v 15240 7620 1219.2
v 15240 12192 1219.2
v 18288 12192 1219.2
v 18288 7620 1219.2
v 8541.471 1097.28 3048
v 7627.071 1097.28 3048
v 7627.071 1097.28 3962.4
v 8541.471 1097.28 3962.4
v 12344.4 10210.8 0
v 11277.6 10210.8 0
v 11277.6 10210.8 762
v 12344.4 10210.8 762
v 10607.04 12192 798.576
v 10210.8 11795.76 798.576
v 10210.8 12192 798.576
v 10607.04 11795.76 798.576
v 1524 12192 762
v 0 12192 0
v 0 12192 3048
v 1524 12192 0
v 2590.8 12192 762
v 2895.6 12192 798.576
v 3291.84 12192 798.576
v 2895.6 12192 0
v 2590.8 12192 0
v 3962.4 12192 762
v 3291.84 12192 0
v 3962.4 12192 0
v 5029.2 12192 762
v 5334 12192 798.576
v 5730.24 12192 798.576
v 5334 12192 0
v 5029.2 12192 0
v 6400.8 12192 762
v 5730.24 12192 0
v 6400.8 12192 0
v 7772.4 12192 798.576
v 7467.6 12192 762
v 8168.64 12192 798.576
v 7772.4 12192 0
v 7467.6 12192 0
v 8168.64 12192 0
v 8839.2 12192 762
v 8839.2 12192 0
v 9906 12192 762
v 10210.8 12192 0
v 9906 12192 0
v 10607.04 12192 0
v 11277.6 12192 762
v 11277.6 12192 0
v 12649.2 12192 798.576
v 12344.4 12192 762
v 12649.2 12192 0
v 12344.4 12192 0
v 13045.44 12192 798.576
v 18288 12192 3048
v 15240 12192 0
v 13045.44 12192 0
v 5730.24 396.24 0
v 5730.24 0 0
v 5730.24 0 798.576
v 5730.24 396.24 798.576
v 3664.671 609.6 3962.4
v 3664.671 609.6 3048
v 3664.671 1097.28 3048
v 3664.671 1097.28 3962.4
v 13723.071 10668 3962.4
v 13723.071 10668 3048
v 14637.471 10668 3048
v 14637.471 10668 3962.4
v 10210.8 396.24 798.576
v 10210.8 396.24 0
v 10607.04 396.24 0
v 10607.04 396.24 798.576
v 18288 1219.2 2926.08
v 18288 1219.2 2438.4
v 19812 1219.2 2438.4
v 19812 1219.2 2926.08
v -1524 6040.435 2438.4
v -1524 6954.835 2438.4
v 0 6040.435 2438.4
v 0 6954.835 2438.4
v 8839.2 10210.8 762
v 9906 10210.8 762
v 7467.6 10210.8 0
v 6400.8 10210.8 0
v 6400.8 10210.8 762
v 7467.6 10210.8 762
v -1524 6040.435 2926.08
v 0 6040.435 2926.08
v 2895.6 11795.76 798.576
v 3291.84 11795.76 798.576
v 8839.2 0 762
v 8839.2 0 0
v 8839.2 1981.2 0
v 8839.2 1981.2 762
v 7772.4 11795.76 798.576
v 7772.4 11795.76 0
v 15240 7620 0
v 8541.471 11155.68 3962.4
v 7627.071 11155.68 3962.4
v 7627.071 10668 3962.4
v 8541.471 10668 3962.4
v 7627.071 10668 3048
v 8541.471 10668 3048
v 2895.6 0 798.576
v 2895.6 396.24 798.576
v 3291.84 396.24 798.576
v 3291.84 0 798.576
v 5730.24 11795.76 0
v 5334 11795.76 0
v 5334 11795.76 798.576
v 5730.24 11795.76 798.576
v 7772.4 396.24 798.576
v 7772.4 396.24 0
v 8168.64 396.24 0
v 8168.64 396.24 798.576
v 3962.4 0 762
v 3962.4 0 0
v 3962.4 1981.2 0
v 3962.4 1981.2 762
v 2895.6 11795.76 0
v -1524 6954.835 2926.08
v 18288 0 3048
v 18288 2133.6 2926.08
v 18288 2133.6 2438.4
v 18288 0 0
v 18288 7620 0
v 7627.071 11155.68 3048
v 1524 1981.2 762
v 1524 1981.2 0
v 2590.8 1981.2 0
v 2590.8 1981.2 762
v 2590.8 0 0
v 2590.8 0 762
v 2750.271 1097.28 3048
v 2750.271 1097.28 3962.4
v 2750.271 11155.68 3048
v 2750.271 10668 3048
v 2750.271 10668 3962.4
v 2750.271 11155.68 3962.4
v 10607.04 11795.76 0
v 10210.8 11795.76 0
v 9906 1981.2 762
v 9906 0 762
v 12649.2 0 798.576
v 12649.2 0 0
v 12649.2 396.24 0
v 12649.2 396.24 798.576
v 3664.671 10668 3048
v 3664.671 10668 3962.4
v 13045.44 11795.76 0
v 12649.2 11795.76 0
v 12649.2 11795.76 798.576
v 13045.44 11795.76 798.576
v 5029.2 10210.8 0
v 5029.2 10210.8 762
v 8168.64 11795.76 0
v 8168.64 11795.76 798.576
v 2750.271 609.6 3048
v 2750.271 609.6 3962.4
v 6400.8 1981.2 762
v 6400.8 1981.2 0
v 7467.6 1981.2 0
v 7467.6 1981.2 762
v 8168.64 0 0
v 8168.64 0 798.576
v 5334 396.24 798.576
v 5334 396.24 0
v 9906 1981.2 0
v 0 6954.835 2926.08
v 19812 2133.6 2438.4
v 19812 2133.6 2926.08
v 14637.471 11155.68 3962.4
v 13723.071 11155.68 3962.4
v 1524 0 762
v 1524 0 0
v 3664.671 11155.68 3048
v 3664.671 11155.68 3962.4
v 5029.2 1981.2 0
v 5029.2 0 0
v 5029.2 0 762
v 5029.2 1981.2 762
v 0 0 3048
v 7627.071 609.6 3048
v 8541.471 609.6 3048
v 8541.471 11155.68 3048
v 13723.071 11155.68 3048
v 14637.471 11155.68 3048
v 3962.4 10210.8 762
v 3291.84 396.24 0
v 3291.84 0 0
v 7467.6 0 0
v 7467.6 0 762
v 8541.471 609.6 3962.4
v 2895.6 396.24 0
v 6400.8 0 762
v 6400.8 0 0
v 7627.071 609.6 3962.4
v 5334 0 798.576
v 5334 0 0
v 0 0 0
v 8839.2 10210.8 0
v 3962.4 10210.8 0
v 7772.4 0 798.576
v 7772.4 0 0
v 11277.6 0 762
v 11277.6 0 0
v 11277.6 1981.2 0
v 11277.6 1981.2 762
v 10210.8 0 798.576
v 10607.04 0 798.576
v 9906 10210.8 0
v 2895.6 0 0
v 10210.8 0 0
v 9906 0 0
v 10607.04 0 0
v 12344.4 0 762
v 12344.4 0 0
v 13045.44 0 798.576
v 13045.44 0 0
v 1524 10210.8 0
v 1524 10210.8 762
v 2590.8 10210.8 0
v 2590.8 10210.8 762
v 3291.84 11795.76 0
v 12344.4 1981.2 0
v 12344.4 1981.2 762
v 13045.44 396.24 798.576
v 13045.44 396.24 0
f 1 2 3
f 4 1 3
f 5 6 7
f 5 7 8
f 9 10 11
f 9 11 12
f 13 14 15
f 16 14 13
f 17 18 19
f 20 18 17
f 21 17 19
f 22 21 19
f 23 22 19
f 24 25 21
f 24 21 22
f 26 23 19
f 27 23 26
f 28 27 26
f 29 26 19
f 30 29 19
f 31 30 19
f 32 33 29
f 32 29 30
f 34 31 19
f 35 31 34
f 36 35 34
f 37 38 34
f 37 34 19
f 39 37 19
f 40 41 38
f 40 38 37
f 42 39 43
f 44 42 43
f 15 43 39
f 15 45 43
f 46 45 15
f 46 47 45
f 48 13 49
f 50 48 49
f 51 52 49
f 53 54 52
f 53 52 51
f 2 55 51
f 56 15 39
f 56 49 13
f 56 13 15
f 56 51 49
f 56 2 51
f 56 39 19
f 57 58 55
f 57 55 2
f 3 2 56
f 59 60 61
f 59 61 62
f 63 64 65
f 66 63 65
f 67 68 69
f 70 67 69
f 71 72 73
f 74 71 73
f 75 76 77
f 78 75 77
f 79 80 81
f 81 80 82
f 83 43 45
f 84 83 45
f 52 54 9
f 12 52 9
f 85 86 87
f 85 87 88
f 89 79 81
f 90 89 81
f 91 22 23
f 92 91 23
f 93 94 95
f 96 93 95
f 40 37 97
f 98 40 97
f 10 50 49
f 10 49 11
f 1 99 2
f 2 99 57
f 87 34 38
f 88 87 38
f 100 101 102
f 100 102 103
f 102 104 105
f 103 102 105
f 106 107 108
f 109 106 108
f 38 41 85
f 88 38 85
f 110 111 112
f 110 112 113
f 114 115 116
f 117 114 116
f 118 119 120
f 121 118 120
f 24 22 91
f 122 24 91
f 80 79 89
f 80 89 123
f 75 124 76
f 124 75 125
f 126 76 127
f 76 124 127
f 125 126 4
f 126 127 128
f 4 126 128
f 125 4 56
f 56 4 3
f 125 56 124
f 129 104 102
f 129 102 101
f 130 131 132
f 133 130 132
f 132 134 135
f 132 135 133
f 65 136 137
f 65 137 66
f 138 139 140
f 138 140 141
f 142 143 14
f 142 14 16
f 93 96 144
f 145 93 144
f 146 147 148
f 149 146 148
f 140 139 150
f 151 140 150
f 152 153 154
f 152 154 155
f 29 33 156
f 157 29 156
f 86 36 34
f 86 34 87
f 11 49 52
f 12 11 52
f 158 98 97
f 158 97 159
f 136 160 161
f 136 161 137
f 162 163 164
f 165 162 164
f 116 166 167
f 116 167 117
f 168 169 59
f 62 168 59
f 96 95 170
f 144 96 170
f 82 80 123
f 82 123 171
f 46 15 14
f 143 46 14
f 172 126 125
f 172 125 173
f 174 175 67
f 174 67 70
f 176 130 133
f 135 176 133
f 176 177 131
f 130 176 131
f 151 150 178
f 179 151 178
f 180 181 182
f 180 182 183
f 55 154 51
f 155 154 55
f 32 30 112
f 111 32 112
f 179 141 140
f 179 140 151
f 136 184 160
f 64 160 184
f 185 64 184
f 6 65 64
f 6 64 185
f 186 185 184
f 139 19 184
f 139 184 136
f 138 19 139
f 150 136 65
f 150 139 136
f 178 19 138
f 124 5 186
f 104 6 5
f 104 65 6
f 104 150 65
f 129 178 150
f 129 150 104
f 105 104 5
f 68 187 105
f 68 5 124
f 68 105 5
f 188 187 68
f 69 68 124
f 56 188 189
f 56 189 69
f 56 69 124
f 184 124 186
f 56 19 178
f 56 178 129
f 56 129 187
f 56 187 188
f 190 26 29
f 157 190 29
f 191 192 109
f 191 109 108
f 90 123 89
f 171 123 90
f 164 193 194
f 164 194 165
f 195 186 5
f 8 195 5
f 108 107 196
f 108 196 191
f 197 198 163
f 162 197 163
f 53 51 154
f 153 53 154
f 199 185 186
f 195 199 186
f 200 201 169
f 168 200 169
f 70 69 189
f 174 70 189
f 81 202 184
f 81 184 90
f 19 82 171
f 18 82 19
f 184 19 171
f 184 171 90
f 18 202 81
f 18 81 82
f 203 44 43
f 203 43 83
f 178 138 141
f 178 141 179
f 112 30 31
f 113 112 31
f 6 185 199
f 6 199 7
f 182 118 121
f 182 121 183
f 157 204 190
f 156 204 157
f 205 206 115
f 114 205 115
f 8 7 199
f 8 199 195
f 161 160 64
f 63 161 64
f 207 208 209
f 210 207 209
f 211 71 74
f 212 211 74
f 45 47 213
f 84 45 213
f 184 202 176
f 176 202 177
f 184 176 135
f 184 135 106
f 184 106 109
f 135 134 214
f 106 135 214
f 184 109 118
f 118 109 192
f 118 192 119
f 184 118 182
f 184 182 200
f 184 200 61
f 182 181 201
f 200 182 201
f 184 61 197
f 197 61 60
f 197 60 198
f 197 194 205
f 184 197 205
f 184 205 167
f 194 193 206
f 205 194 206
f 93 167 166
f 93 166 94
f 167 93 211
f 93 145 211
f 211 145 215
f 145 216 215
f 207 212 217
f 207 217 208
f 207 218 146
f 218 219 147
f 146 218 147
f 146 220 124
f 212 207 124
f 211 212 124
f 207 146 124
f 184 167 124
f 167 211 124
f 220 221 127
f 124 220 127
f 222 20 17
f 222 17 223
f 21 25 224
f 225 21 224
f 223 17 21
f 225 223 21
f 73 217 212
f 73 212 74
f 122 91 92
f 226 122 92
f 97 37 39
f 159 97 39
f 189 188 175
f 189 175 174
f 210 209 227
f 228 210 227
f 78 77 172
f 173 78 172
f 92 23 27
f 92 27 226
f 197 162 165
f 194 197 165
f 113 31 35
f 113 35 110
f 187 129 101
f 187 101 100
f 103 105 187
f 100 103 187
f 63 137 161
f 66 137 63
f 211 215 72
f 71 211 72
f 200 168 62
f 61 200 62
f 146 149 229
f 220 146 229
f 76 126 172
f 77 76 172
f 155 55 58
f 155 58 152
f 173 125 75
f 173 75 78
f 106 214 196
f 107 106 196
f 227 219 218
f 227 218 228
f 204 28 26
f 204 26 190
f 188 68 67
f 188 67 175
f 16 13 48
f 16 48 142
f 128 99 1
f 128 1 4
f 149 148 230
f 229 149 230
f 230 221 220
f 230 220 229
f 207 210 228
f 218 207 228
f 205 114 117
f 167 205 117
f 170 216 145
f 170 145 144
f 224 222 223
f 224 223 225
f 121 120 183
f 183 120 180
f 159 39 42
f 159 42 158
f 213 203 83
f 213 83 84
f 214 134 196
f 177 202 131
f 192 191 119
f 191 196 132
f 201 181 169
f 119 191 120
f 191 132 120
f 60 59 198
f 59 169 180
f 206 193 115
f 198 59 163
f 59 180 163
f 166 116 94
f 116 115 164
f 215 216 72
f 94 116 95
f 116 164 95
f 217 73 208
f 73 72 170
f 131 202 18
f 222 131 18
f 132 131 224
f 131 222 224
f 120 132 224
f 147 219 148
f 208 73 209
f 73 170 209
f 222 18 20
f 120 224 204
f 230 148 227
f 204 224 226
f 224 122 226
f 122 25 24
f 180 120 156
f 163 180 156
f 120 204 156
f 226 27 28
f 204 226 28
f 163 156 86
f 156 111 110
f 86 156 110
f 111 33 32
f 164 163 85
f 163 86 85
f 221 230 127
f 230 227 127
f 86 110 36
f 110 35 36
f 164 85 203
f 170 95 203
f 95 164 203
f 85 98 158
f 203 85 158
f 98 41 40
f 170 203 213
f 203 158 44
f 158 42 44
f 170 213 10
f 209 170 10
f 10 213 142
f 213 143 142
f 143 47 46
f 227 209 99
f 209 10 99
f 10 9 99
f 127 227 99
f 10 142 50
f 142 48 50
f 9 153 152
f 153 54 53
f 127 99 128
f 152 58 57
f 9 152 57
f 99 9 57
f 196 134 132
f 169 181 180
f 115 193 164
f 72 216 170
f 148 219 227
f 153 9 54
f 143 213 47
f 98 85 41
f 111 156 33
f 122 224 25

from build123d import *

# Parameters (mm, degrees)
BOX011_W     = 3048
BOX011_H     = 4572
BOX011_DEPTH = 1219.2
BOX006_W     = 1066.8
BOX006_H     = 1981.2
BOX006_DEPTH = 762
BOX005_W     = 396.24
BOX005_H     = 396.24
BOX005_DEPTH = 798.576
BOX007_W     = 1066.8
BOX007_H     = 1981.2
BOX007_DEPTH = 762
BOX008_W     = 396.24
BOX008_H     = 396.24
BOX008_DEPTH = 798.576
BOX010_W     = 1066.8
BOX010_H     = 1981.2
BOX010_DEPTH = 762
BOX009_W     = 396.24
BOX009_H     = 396.24
BOX009_DEPTH = 798.576
BOX001_W     = 1066.8
BOX001_H     = 1981.2
BOX001_DEPTH = 762
BOX002_W     = 396.24
BOX002_H     = 396.24
BOX002_DEPTH = 798.576
BOX003_W     = 1066.8
BOX003_H     = 1981.2
BOX003_DEPTH = 762
BOX004_W     = 396.24
BOX004_H     = 396.24
BOX004_DEPTH = 798.576
BOX012_W     = 2438.4
BOX012_H     = 914.4
BOX012_DEPTH = 487.68
BOX013_W     = 2438.4
BOX013_H     = 914.4
BOX013_DEPTH = 487.68
BOX016_W     = 914.4
BOX016_H     = 487.68
BOX016_DEPTH = 1219.2
BOX017_W     = 914.4
BOX017_H     = 487.68
BOX017_DEPTH = 1219.2
BOX018_W     = 914.4
BOX018_H     = 487.68
BOX018_DEPTH = 1219.2
BOX019_W     = 914.4
BOX019_H     = 487.68
BOX019_DEPTH = 1219.2
BOX014_W     = 914.4
BOX014_H     = 487.68
BOX014_DEPTH = 1219.2
BOX_W        = 18288
BOX_H        = 12192
BOX_DEPTH    = 3048


with BuildPart() as nurse_station:
    # Box011 → Box011 (new body)
    with BuildSketch(Plane(origin=(15240, 7620, 0), x_dir=(1, 0, 0), z_dir=(0, 0, 1))):
        with Locations((1524, 2286)):
            Rectangle(BOX011_W, BOX011_H)
    extrude(amount=BOX011_DEPTH)


with BuildPart() as box006:
    # Box006 → Box006 (new body)
    with BuildSketch(Plane.XY):
        with Locations((533.4, 990.6)):
            Rectangle(BOX006_W, BOX006_H)
    extrude(amount=BOX006_DEPTH)


with BuildPart() as fusion002:
    # Box005 → Box005 (new body)
    with BuildSketch(Plane(origin=(1371.6, 0, 0), x_dir=(1, 0, 0), z_dir=(0, 0, 1))):
        with Locations((198.12, 198.12)):
            Rectangle(BOX005_W, BOX005_H)
    extrude(amount=BOX005_DEPTH)

    # Fusion002: union Box006
    add(box006.part)


with BuildPart() as fusion002_1:
    # Fusion002 placement: moved
    add(fusion002.part.moved(Location((4876.8, 0, 0))))


with BuildPart() as box007:
    # Box007 → Box007 (new body)
    with BuildSketch(Plane.XY):
        with Locations((533.4, 990.6)):
            Rectangle(BOX007_W, BOX007_H)
    extrude(amount=BOX007_DEPTH)


with BuildPart() as fusion003:
    # Box008 → Box008 (new body)
    with BuildSketch(Plane(origin=(1371.6, 0, 0), x_dir=(1, 0, 0), z_dir=(0, 0, 1))):
        with Locations((198.12, 198.12)):
            Rectangle(BOX008_W, BOX008_H)
    extrude(amount=BOX008_DEPTH)

    # Fusion003: union Box007
    add(box007.part)


with BuildPart() as fusion003_1:
    # Fusion003 placement: moved
    add(fusion003.part.moved(Location((7315.2, 0, 0))))


with BuildPart() as box010:
    # Box010 → Box010 (new body)
    with BuildSketch(Plane.XY):
        with Locations((533.4, 990.6)):
            Rectangle(BOX010_W, BOX010_H)
    extrude(amount=BOX010_DEPTH)


with BuildPart() as fusion004:
    # Box009 → Box009 (new body)
    with BuildSketch(Plane(origin=(1371.6, 0, 0), x_dir=(1, 0, 0), z_dir=(0, 0, 1))):
        with Locations((198.12, 198.12)):
            Rectangle(BOX009_W, BOX009_H)
    extrude(amount=BOX009_DEPTH)

    # Fusion004: union Box010
    add(box010.part)


with BuildPart() as fusion004_1:
    # Fusion004 placement: moved
    add(fusion004.part.moved(Location((9753.6, 0, 0))))


with BuildPart() as box001:
    # Box001 → Box001 (new body)
    with BuildSketch(Plane.XY):
        with Locations((533.4, 990.6)):
            Rectangle(BOX001_W, BOX001_H)
    extrude(amount=BOX001_DEPTH)


with BuildPart() as fusion:
    # Box002 → Box002 (new body)
    with BuildSketch(Plane(origin=(1371.6, 0, 0), x_dir=(1, 0, 0), z_dir=(0, 0, 1))):
        with Locations((198.12, 198.12)):
            Rectangle(BOX002_W, BOX002_H)
    extrude(amount=BOX002_DEPTH)

    # Fusion: union Box001
    add(box001.part)


with BuildPart() as box003:
    # Box003 → Box003 (new body)
    with BuildSketch(Plane.XY):
        with Locations((533.4, 990.6)):
            Rectangle(BOX003_W, BOX003_H)
    extrude(amount=BOX003_DEPTH)


with BuildPart() as right_beds:
    # Box004 → Box004 (new body)
    with BuildSketch(Plane(origin=(1371.6, 0, 0), x_dir=(1, 0, 0), z_dir=(0, 0, 1))):
        with Locations((198.12, 198.12)):
            Rectangle(BOX004_W, BOX004_H)
    extrude(amount=BOX004_DEPTH)

    # Fusion001: union Box003
    add(box003.part)


with BuildPart() as right_beds_1:
    # Fusion001 placement: moved
    add(right_beds.part.moved(Location((2438.4, 0, 0))))

    # Fusion005: union Fusion002, Fusion003, Fusion004, Fusion
    add(fusion002_1.part)
    add(fusion003_1.part)
    add(fusion004_1.part)
    add(fusion.part)


with BuildPart() as surfaces:
    # Part__Mirroring: instance of right beds
    add(right_beds_1.part.mirror(Plane(origin=(0, 6096, 0), x_dir=(1, 0, 0), z_dir=(0, 1, 0))))

    # Fusion006: union right beds
    add(right_beds_1.part)


with BuildPart() as surfaces_1:
    # Fusion006 placement: moved
    add(surfaces.part.moved(Location((1524, 0, 0))))

    # Fusion010: union Nurse Station
    add(nurse_station.part)


with BuildPart() as main_inlet:
    # Box012 → Box012 (new body)
    with BuildSketch(Plane(origin=(17373.6, 1219.2, 2438.4), x_dir=(1, 0, 0), z_dir=(0, 0, 1))):
        with Locations((1219.2, 457.2)):
            Rectangle(BOX012_W, BOX012_H)
    extrude(amount=BOX012_DEPTH)


with BuildPart() as main_ducts:
    # Box013 → Box013 (new body)
    with BuildSketch(Plane(origin=(-1524, 6040.43496, 2438.4), x_dir=(1, 0, 0), z_dir=(0, 0, 1))):
        with Locations((1219.2, 457.2)):
            Rectangle(BOX013_W, BOX013_H)
    extrude(amount=BOX013_DEPTH)

    # Fusion007: union main inlet
    add(main_inlet.part)


with BuildPart() as branch002:
    # Box016 → Box016 (new body)
    with BuildSketch(Plane(origin=(7924.8, 609.6, 2743.2), x_dir=(1, 0, 0), z_dir=(0, 0, 1))):
        with Locations((457.2, 243.84)):
            Rectangle(BOX016_W, BOX016_H)
    extrude(amount=BOX016_DEPTH)


with BuildPart() as branch003:
    # Box017 → Box017 (new body)
    with BuildSketch(Plane(origin=(7924.8, 10668, 2743.2), x_dir=(1, 0, 0), z_dir=(0, 0, 1))):
        with Locations((457.2, 243.84)):
            Rectangle(BOX017_W, BOX017_H)
    extrude(amount=BOX017_DEPTH)


with BuildPart() as branch004:
    # Box018 → Box018 (new body)
    with BuildSketch(Plane(origin=(3048, 609.6, 2743.2), x_dir=(1, 0, 0), z_dir=(0, 0, 1))):
        with Locations((457.2, 243.84)):
            Rectangle(BOX018_W, BOX018_H)
    extrude(amount=BOX018_DEPTH)


with BuildPart() as branch005:
    # Box019 → Box019 (new body)
    with BuildSketch(Plane(origin=(3048, 10668, 2743.2), x_dir=(1, 0, 0), z_dir=(0, 0, 1))):
        with Locations((457.2, 243.84)):
            Rectangle(BOX019_W, BOX019_H)
    extrude(amount=BOX019_DEPTH)


with BuildPart() as vents:
    # Box014 → Box014 (new body)
    with BuildSketch(Plane(origin=(14020.8, 10668, 2743.2), x_dir=(1, 0, 0), z_dir=(0, 0, 1))):
        with Locations((457.2, 243.84)):
            Rectangle(BOX014_W, BOX014_H)
    extrude(amount=BOX014_DEPTH)

    # Fusion008: union branch002, branch003, branch004, branch005
    add(branch002.part)
    add(branch003.part)
    add(branch004.part)
    add(branch005.part)


with BuildPart() as vents_1:
    # Fusion008 placement: moved
    add(vents.part.moved(Location((-297.72864, 0, 0))))

    # Fusion009: union main_ducts
    add(main_ducts.part)


with BuildPart() as cut:
    # Box → Box (new body)
    with BuildSketch(Plane.XY):
        with Locations((9144, 6096)):
            Rectangle(BOX_W, BOX_H)
    extrude(amount=BOX_DEPTH)

    # Fusion011: union vents
    add(vents_1.part)

    # Cut: cut surfaces
    add(surfaces_1.part, mode=Mode.SUBTRACT)


solid = cut.part
